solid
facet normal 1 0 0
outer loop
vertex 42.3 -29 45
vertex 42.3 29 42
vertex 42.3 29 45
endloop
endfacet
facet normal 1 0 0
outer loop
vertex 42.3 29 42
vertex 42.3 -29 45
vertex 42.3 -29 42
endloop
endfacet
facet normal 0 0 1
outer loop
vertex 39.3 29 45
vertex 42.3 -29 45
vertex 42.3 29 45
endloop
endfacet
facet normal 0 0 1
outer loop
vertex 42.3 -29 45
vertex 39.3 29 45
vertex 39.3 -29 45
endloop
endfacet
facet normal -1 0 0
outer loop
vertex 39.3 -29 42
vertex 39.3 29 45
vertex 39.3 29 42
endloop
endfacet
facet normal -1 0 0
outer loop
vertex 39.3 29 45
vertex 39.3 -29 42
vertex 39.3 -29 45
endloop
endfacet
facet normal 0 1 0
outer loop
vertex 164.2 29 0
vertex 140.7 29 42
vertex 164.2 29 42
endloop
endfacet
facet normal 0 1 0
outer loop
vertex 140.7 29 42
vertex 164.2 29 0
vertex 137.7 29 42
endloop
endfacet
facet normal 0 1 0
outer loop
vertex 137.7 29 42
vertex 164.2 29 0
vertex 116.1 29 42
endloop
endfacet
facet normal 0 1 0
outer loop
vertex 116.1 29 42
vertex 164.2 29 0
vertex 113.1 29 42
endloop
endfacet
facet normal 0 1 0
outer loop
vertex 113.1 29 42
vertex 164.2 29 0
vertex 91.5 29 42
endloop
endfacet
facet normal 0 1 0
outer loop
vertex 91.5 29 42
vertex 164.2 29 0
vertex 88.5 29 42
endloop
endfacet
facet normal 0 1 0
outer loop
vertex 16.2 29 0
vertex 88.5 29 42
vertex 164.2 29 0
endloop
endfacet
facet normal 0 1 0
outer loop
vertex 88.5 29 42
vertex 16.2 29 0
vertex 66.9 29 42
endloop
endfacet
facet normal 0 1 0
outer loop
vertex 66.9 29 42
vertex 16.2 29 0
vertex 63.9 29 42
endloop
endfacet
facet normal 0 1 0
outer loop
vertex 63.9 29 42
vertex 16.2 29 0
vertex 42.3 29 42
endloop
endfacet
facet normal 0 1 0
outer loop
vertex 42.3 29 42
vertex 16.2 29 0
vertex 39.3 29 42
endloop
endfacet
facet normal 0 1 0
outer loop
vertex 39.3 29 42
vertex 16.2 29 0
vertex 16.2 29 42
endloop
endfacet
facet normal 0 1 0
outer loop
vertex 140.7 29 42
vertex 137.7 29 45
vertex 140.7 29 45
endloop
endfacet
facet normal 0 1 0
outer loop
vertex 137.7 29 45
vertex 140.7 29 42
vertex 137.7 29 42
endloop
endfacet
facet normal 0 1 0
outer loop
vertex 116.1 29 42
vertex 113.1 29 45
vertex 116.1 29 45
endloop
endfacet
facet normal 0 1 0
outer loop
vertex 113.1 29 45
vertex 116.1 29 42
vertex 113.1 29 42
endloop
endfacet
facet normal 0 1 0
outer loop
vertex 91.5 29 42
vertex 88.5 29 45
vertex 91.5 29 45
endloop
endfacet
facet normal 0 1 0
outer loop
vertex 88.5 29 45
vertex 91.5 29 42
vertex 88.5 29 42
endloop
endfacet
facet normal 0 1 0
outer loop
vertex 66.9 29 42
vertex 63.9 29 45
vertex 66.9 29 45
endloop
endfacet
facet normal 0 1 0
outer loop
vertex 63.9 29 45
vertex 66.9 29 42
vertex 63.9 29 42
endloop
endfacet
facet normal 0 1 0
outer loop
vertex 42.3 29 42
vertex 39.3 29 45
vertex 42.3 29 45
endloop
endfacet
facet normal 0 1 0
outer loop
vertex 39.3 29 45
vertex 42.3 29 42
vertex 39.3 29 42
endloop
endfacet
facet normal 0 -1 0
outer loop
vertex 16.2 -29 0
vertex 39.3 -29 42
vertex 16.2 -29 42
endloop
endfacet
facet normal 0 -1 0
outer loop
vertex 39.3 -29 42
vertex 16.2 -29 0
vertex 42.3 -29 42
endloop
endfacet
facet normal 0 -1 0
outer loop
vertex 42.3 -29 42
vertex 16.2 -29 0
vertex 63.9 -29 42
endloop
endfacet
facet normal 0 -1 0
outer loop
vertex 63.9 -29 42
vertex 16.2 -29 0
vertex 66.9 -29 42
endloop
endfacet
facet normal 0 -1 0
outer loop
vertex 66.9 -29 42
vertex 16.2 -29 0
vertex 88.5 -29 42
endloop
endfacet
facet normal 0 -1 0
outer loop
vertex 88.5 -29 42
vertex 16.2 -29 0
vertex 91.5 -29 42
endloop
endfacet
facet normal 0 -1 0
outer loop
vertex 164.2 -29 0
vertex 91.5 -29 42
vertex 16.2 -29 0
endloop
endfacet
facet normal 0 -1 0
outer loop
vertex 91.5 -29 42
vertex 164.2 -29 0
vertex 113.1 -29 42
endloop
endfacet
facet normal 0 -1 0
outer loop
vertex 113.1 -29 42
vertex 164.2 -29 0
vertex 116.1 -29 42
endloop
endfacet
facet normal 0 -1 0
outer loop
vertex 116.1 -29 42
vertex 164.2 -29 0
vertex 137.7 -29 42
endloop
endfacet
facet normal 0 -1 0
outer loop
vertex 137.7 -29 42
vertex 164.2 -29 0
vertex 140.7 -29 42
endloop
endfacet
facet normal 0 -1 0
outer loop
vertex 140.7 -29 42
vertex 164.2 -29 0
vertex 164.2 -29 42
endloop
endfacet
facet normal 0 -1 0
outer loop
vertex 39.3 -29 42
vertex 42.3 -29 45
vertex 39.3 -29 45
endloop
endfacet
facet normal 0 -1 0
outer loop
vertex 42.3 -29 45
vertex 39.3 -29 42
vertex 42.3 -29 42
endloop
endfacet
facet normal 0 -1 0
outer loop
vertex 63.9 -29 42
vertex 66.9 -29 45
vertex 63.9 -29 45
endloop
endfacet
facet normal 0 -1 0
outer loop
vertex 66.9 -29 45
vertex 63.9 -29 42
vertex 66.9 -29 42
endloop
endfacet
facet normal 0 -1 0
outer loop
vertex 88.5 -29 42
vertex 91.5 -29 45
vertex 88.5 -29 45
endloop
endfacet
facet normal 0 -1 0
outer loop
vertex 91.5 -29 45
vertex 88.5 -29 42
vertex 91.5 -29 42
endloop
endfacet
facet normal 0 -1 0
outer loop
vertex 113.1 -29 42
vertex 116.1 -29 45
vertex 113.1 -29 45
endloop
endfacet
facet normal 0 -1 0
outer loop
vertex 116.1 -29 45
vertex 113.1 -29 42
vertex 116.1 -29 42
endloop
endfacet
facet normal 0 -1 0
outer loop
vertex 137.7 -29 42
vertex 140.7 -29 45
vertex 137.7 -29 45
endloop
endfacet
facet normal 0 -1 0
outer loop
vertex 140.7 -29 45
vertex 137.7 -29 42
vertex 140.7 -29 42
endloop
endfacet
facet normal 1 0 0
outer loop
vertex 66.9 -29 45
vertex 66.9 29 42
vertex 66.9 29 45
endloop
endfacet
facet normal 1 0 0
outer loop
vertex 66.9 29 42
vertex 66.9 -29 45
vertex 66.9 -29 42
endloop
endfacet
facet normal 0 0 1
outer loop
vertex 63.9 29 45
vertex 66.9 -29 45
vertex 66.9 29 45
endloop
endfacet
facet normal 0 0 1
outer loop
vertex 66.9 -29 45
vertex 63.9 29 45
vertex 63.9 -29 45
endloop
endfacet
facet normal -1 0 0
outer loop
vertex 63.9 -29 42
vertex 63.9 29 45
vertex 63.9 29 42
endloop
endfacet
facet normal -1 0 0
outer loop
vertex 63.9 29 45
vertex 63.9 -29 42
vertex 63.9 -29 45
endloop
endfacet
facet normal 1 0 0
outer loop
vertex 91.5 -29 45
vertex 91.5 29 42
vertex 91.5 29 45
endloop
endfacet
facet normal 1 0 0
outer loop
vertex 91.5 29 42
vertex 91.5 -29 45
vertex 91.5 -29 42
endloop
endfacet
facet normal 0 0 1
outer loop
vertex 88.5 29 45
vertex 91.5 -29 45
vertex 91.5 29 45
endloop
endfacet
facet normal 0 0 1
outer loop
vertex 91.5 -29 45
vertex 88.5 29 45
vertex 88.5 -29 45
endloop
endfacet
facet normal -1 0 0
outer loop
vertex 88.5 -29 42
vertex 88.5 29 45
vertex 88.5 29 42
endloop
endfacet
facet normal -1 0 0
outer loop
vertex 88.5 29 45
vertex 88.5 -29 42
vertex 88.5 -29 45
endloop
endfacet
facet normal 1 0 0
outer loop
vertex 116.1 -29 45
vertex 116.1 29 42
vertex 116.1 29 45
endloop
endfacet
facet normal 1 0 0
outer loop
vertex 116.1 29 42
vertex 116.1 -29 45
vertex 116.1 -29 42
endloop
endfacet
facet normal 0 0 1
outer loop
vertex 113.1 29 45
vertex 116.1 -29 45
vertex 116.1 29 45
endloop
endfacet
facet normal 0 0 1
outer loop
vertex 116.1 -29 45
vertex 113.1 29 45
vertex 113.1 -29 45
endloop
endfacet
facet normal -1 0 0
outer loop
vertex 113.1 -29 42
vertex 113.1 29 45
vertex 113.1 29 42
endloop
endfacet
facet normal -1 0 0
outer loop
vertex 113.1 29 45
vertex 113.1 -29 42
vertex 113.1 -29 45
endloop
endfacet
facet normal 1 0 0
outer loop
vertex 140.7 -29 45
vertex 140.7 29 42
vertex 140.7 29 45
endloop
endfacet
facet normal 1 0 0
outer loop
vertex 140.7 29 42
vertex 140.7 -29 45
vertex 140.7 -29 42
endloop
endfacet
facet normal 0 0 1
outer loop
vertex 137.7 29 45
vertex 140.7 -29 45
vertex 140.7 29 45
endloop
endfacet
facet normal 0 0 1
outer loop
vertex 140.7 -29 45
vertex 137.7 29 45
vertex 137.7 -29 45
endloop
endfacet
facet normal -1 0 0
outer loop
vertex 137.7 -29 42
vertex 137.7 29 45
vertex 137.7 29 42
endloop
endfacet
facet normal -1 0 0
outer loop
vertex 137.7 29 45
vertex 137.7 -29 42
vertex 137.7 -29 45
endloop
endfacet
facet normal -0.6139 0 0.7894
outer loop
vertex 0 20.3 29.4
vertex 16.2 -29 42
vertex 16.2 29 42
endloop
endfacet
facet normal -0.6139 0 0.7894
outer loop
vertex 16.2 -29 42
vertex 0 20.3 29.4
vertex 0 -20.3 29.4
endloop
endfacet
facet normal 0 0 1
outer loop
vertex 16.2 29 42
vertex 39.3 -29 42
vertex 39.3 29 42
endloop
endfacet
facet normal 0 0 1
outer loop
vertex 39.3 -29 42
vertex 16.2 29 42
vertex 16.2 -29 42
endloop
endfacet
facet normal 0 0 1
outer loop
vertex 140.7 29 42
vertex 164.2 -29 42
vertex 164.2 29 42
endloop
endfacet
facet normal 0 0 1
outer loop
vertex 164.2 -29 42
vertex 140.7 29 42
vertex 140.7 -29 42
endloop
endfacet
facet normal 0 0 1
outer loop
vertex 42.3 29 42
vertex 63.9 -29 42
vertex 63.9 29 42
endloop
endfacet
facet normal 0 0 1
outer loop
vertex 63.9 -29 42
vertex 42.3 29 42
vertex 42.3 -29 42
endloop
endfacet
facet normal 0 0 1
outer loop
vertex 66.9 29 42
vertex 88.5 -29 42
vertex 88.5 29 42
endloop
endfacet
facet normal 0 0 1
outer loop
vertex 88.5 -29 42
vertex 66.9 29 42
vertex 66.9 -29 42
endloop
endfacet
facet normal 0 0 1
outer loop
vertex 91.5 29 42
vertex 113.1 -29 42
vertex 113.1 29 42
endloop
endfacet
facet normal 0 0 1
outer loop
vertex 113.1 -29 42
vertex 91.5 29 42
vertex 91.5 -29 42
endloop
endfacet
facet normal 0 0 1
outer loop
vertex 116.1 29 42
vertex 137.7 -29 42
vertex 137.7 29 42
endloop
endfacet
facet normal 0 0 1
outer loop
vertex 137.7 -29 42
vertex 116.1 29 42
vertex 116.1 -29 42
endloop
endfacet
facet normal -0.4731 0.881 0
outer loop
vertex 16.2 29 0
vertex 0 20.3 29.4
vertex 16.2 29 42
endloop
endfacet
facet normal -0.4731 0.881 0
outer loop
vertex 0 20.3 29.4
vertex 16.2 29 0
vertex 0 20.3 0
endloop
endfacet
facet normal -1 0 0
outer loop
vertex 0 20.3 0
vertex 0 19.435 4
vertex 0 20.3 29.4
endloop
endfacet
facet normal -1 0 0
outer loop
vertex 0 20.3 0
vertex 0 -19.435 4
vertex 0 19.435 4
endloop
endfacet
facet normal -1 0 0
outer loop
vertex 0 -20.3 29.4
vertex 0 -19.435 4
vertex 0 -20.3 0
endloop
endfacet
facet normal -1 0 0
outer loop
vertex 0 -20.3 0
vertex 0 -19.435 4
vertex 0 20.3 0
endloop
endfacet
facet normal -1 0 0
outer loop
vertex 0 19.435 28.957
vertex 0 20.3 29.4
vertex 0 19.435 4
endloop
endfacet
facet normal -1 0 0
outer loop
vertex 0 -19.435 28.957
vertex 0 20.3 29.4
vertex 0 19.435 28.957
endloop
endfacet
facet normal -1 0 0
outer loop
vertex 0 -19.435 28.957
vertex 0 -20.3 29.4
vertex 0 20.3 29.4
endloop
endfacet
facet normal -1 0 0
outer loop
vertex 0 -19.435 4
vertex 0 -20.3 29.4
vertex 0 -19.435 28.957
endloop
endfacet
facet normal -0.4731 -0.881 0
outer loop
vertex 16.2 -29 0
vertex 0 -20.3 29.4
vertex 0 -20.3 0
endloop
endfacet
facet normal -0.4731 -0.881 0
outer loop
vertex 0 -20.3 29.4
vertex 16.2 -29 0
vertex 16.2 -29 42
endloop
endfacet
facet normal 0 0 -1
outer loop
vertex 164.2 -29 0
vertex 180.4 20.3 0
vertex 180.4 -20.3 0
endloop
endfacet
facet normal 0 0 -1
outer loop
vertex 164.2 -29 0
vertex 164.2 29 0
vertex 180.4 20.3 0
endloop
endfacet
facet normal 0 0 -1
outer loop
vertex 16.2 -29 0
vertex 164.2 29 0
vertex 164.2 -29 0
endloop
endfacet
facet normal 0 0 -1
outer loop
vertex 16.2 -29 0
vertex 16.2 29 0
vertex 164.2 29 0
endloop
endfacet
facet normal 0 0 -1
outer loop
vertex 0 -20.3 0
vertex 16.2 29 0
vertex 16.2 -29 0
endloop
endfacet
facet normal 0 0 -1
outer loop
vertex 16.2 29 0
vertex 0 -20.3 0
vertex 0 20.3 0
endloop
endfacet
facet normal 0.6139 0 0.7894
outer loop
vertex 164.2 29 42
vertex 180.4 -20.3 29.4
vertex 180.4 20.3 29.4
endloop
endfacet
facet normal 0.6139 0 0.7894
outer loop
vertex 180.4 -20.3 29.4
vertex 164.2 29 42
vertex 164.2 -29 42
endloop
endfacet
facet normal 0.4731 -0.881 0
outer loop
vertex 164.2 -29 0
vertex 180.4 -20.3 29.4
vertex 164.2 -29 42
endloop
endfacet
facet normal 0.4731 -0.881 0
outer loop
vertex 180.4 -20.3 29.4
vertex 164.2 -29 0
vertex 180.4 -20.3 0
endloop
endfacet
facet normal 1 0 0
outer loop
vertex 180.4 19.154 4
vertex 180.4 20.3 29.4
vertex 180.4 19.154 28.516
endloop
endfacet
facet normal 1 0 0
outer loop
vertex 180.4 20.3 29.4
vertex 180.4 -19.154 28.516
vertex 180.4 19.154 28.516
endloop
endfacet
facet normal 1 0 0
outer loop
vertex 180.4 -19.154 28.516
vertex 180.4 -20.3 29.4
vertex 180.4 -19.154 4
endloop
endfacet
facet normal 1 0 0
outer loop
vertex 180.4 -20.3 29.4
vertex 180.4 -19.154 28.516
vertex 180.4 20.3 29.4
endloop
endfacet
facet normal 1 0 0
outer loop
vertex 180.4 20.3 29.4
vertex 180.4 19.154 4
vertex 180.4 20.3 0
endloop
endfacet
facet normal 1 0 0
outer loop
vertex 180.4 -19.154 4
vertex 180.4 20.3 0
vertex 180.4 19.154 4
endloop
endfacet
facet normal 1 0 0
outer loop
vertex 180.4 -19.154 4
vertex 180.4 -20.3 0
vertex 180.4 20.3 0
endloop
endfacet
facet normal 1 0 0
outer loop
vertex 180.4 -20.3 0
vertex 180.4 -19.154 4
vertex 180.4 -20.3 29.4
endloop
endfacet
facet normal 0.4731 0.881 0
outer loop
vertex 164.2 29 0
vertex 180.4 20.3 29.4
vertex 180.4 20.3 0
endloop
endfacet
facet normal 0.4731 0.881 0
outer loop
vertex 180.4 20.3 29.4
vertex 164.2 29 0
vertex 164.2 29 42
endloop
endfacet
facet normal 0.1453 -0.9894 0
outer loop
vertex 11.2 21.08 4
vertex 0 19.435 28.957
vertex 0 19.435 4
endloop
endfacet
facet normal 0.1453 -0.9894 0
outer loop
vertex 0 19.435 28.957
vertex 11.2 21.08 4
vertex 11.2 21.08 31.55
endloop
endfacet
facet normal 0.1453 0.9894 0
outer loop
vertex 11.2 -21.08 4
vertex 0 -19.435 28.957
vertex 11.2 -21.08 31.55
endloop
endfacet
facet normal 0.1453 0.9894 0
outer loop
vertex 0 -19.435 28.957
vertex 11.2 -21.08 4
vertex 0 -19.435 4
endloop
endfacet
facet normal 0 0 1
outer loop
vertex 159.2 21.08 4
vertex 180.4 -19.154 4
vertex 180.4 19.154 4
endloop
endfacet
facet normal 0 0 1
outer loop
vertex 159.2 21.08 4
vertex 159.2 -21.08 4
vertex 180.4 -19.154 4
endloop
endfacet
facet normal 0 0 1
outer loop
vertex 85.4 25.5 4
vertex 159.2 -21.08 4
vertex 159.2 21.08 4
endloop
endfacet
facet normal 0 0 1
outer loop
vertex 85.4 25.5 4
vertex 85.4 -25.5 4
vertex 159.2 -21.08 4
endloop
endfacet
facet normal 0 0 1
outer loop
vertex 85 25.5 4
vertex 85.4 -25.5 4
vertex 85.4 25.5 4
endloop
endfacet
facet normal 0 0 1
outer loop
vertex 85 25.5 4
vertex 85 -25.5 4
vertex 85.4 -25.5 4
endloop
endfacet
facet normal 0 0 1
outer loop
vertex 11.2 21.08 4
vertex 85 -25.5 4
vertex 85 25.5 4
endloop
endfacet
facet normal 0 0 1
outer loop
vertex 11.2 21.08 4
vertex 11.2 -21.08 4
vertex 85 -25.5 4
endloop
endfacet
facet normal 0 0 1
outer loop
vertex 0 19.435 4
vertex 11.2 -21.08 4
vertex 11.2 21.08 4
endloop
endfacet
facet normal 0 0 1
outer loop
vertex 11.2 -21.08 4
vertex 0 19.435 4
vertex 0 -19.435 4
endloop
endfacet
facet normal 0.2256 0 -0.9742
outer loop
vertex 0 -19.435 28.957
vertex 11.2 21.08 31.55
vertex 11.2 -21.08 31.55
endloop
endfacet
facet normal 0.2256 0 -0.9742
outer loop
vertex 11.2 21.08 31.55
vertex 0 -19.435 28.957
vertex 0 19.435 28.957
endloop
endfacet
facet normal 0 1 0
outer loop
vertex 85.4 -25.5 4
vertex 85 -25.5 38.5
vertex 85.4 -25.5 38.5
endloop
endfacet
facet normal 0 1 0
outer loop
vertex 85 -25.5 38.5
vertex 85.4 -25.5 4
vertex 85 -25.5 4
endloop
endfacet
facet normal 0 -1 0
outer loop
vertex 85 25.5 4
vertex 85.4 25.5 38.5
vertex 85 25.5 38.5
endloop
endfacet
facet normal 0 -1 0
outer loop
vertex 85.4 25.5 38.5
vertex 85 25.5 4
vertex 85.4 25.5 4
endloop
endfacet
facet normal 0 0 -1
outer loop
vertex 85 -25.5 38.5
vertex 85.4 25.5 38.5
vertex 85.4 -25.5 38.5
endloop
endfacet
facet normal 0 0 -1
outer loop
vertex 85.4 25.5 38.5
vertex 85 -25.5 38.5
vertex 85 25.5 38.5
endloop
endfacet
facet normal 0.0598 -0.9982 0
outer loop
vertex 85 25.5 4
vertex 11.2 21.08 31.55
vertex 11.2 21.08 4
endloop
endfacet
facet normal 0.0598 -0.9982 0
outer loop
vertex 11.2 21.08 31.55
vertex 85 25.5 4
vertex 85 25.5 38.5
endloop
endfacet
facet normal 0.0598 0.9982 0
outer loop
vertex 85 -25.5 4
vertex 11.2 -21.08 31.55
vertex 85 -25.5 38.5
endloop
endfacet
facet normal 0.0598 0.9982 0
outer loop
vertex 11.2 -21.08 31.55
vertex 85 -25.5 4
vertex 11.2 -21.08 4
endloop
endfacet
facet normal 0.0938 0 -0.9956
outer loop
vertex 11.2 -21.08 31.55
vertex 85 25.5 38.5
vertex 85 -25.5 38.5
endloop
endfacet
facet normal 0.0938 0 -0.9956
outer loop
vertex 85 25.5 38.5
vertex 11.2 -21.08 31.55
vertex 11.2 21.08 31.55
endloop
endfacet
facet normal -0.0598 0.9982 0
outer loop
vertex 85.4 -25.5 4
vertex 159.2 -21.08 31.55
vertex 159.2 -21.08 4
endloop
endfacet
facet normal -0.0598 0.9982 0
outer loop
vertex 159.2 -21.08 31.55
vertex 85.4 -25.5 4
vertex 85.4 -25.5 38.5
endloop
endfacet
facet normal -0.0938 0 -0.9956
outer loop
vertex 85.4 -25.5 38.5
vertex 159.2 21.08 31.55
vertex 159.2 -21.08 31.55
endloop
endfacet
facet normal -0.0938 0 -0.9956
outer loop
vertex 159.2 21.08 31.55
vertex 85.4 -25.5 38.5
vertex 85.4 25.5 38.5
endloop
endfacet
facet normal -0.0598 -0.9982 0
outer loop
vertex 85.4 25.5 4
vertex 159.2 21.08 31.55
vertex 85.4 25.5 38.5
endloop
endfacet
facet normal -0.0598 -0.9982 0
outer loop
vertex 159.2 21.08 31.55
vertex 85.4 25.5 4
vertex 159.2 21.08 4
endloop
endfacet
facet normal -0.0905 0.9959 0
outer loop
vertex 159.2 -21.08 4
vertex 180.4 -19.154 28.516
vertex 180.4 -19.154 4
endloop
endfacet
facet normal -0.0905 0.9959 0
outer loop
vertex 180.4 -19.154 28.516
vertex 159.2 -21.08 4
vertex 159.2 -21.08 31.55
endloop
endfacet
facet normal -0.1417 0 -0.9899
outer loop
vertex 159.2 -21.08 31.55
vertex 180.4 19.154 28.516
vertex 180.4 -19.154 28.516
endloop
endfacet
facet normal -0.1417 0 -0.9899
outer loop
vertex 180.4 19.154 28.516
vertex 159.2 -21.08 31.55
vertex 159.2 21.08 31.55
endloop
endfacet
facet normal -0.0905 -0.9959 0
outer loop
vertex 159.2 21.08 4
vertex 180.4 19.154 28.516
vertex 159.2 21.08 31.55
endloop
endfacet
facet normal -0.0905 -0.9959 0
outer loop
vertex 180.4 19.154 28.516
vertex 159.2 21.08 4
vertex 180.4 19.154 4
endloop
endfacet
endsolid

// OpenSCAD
$fn = 32;

// ----------------------------------------------------------------------
// Faired channel: 180 x 58 x 42 mm, 3.5 mm walls, faired ends
// ----------------------------------------------------------------------

// --- parameters (mm) ---
length = 180;             // channel length
width = 58;               // channel width at mid length
height = 42;              // channel height at mid length
wall = 3.5;               // side wall thickness
floor_t = 4;              // floor thickness
end_w = 40.6;             // faired end width
end_h = 29.4;             // faired end height
ribs = 5;                 // stiffening ribs on the top
rib_t = 3;                // rib thickness
rib_h = 3;                // rib height

difference() {
  union() {
    hull() {
      translate([0, -20.3, 0]) cube([0.4, 40.6, 29.4]);
      translate([16.2, -29, 0]) cube([0.4, 58, 42]);
    }
    hull() {
      translate([16.2, -29, 0]) cube([0.4, 58, 42]);
      translate([90, -29, 0]) cube([0.4, 58, 42]);
    }
    hull() {
      translate([90, -29, 0]) cube([0.4, 58, 42]);
      translate([163.8, -29, 0]) cube([0.4, 58, 42]);
    }
    hull() {
      translate([163.8, -29, 0]) cube([0.4, 58, 42]);
      translate([180, -20.3, 0]) cube([0.4, 40.6, 29.4]);
    }
    /* stiffening ribs across the flat top, sunk 0.8 mm into it */
    for (i = [1 : ribs]) {
      translate([16.2 + i * (length - 2 * 16.2) / (ribs + 1) - rib_t / 2, -width / 2, height - 0.8]) cube([rib_t, width, rib_h + 0.8]);
    }
  }
  /* cavity, 5 mm proud of both ends so the ports are cut clean */
  hull() {
    translate([-5, -18.7, 4]) cube([0.4, 37.4, 23.8]);
    translate([11.2, -21.08, 4]) cube([0.4, 42.16, 27.55]);
  }
  hull() {
    translate([11.2, -21.08, 4]) cube([0.4, 42.16, 27.55]);
    translate([85, -25.5, 4]) cube([0.4, 51, 34.5]);
  }
  hull() {
    translate([85, -25.5, 4]) cube([0.4, 51, 34.5]);
    translate([158.8, -21.08, 4]) cube([0.4, 42.16, 27.55]);
  }
  hull() {
    translate([158.8, -21.08, 4]) cube([0.4, 42.16, 27.55]);
    translate([185, -18.7, 4]) cube([0.4, 37.4, 23.8]);
  }
}
